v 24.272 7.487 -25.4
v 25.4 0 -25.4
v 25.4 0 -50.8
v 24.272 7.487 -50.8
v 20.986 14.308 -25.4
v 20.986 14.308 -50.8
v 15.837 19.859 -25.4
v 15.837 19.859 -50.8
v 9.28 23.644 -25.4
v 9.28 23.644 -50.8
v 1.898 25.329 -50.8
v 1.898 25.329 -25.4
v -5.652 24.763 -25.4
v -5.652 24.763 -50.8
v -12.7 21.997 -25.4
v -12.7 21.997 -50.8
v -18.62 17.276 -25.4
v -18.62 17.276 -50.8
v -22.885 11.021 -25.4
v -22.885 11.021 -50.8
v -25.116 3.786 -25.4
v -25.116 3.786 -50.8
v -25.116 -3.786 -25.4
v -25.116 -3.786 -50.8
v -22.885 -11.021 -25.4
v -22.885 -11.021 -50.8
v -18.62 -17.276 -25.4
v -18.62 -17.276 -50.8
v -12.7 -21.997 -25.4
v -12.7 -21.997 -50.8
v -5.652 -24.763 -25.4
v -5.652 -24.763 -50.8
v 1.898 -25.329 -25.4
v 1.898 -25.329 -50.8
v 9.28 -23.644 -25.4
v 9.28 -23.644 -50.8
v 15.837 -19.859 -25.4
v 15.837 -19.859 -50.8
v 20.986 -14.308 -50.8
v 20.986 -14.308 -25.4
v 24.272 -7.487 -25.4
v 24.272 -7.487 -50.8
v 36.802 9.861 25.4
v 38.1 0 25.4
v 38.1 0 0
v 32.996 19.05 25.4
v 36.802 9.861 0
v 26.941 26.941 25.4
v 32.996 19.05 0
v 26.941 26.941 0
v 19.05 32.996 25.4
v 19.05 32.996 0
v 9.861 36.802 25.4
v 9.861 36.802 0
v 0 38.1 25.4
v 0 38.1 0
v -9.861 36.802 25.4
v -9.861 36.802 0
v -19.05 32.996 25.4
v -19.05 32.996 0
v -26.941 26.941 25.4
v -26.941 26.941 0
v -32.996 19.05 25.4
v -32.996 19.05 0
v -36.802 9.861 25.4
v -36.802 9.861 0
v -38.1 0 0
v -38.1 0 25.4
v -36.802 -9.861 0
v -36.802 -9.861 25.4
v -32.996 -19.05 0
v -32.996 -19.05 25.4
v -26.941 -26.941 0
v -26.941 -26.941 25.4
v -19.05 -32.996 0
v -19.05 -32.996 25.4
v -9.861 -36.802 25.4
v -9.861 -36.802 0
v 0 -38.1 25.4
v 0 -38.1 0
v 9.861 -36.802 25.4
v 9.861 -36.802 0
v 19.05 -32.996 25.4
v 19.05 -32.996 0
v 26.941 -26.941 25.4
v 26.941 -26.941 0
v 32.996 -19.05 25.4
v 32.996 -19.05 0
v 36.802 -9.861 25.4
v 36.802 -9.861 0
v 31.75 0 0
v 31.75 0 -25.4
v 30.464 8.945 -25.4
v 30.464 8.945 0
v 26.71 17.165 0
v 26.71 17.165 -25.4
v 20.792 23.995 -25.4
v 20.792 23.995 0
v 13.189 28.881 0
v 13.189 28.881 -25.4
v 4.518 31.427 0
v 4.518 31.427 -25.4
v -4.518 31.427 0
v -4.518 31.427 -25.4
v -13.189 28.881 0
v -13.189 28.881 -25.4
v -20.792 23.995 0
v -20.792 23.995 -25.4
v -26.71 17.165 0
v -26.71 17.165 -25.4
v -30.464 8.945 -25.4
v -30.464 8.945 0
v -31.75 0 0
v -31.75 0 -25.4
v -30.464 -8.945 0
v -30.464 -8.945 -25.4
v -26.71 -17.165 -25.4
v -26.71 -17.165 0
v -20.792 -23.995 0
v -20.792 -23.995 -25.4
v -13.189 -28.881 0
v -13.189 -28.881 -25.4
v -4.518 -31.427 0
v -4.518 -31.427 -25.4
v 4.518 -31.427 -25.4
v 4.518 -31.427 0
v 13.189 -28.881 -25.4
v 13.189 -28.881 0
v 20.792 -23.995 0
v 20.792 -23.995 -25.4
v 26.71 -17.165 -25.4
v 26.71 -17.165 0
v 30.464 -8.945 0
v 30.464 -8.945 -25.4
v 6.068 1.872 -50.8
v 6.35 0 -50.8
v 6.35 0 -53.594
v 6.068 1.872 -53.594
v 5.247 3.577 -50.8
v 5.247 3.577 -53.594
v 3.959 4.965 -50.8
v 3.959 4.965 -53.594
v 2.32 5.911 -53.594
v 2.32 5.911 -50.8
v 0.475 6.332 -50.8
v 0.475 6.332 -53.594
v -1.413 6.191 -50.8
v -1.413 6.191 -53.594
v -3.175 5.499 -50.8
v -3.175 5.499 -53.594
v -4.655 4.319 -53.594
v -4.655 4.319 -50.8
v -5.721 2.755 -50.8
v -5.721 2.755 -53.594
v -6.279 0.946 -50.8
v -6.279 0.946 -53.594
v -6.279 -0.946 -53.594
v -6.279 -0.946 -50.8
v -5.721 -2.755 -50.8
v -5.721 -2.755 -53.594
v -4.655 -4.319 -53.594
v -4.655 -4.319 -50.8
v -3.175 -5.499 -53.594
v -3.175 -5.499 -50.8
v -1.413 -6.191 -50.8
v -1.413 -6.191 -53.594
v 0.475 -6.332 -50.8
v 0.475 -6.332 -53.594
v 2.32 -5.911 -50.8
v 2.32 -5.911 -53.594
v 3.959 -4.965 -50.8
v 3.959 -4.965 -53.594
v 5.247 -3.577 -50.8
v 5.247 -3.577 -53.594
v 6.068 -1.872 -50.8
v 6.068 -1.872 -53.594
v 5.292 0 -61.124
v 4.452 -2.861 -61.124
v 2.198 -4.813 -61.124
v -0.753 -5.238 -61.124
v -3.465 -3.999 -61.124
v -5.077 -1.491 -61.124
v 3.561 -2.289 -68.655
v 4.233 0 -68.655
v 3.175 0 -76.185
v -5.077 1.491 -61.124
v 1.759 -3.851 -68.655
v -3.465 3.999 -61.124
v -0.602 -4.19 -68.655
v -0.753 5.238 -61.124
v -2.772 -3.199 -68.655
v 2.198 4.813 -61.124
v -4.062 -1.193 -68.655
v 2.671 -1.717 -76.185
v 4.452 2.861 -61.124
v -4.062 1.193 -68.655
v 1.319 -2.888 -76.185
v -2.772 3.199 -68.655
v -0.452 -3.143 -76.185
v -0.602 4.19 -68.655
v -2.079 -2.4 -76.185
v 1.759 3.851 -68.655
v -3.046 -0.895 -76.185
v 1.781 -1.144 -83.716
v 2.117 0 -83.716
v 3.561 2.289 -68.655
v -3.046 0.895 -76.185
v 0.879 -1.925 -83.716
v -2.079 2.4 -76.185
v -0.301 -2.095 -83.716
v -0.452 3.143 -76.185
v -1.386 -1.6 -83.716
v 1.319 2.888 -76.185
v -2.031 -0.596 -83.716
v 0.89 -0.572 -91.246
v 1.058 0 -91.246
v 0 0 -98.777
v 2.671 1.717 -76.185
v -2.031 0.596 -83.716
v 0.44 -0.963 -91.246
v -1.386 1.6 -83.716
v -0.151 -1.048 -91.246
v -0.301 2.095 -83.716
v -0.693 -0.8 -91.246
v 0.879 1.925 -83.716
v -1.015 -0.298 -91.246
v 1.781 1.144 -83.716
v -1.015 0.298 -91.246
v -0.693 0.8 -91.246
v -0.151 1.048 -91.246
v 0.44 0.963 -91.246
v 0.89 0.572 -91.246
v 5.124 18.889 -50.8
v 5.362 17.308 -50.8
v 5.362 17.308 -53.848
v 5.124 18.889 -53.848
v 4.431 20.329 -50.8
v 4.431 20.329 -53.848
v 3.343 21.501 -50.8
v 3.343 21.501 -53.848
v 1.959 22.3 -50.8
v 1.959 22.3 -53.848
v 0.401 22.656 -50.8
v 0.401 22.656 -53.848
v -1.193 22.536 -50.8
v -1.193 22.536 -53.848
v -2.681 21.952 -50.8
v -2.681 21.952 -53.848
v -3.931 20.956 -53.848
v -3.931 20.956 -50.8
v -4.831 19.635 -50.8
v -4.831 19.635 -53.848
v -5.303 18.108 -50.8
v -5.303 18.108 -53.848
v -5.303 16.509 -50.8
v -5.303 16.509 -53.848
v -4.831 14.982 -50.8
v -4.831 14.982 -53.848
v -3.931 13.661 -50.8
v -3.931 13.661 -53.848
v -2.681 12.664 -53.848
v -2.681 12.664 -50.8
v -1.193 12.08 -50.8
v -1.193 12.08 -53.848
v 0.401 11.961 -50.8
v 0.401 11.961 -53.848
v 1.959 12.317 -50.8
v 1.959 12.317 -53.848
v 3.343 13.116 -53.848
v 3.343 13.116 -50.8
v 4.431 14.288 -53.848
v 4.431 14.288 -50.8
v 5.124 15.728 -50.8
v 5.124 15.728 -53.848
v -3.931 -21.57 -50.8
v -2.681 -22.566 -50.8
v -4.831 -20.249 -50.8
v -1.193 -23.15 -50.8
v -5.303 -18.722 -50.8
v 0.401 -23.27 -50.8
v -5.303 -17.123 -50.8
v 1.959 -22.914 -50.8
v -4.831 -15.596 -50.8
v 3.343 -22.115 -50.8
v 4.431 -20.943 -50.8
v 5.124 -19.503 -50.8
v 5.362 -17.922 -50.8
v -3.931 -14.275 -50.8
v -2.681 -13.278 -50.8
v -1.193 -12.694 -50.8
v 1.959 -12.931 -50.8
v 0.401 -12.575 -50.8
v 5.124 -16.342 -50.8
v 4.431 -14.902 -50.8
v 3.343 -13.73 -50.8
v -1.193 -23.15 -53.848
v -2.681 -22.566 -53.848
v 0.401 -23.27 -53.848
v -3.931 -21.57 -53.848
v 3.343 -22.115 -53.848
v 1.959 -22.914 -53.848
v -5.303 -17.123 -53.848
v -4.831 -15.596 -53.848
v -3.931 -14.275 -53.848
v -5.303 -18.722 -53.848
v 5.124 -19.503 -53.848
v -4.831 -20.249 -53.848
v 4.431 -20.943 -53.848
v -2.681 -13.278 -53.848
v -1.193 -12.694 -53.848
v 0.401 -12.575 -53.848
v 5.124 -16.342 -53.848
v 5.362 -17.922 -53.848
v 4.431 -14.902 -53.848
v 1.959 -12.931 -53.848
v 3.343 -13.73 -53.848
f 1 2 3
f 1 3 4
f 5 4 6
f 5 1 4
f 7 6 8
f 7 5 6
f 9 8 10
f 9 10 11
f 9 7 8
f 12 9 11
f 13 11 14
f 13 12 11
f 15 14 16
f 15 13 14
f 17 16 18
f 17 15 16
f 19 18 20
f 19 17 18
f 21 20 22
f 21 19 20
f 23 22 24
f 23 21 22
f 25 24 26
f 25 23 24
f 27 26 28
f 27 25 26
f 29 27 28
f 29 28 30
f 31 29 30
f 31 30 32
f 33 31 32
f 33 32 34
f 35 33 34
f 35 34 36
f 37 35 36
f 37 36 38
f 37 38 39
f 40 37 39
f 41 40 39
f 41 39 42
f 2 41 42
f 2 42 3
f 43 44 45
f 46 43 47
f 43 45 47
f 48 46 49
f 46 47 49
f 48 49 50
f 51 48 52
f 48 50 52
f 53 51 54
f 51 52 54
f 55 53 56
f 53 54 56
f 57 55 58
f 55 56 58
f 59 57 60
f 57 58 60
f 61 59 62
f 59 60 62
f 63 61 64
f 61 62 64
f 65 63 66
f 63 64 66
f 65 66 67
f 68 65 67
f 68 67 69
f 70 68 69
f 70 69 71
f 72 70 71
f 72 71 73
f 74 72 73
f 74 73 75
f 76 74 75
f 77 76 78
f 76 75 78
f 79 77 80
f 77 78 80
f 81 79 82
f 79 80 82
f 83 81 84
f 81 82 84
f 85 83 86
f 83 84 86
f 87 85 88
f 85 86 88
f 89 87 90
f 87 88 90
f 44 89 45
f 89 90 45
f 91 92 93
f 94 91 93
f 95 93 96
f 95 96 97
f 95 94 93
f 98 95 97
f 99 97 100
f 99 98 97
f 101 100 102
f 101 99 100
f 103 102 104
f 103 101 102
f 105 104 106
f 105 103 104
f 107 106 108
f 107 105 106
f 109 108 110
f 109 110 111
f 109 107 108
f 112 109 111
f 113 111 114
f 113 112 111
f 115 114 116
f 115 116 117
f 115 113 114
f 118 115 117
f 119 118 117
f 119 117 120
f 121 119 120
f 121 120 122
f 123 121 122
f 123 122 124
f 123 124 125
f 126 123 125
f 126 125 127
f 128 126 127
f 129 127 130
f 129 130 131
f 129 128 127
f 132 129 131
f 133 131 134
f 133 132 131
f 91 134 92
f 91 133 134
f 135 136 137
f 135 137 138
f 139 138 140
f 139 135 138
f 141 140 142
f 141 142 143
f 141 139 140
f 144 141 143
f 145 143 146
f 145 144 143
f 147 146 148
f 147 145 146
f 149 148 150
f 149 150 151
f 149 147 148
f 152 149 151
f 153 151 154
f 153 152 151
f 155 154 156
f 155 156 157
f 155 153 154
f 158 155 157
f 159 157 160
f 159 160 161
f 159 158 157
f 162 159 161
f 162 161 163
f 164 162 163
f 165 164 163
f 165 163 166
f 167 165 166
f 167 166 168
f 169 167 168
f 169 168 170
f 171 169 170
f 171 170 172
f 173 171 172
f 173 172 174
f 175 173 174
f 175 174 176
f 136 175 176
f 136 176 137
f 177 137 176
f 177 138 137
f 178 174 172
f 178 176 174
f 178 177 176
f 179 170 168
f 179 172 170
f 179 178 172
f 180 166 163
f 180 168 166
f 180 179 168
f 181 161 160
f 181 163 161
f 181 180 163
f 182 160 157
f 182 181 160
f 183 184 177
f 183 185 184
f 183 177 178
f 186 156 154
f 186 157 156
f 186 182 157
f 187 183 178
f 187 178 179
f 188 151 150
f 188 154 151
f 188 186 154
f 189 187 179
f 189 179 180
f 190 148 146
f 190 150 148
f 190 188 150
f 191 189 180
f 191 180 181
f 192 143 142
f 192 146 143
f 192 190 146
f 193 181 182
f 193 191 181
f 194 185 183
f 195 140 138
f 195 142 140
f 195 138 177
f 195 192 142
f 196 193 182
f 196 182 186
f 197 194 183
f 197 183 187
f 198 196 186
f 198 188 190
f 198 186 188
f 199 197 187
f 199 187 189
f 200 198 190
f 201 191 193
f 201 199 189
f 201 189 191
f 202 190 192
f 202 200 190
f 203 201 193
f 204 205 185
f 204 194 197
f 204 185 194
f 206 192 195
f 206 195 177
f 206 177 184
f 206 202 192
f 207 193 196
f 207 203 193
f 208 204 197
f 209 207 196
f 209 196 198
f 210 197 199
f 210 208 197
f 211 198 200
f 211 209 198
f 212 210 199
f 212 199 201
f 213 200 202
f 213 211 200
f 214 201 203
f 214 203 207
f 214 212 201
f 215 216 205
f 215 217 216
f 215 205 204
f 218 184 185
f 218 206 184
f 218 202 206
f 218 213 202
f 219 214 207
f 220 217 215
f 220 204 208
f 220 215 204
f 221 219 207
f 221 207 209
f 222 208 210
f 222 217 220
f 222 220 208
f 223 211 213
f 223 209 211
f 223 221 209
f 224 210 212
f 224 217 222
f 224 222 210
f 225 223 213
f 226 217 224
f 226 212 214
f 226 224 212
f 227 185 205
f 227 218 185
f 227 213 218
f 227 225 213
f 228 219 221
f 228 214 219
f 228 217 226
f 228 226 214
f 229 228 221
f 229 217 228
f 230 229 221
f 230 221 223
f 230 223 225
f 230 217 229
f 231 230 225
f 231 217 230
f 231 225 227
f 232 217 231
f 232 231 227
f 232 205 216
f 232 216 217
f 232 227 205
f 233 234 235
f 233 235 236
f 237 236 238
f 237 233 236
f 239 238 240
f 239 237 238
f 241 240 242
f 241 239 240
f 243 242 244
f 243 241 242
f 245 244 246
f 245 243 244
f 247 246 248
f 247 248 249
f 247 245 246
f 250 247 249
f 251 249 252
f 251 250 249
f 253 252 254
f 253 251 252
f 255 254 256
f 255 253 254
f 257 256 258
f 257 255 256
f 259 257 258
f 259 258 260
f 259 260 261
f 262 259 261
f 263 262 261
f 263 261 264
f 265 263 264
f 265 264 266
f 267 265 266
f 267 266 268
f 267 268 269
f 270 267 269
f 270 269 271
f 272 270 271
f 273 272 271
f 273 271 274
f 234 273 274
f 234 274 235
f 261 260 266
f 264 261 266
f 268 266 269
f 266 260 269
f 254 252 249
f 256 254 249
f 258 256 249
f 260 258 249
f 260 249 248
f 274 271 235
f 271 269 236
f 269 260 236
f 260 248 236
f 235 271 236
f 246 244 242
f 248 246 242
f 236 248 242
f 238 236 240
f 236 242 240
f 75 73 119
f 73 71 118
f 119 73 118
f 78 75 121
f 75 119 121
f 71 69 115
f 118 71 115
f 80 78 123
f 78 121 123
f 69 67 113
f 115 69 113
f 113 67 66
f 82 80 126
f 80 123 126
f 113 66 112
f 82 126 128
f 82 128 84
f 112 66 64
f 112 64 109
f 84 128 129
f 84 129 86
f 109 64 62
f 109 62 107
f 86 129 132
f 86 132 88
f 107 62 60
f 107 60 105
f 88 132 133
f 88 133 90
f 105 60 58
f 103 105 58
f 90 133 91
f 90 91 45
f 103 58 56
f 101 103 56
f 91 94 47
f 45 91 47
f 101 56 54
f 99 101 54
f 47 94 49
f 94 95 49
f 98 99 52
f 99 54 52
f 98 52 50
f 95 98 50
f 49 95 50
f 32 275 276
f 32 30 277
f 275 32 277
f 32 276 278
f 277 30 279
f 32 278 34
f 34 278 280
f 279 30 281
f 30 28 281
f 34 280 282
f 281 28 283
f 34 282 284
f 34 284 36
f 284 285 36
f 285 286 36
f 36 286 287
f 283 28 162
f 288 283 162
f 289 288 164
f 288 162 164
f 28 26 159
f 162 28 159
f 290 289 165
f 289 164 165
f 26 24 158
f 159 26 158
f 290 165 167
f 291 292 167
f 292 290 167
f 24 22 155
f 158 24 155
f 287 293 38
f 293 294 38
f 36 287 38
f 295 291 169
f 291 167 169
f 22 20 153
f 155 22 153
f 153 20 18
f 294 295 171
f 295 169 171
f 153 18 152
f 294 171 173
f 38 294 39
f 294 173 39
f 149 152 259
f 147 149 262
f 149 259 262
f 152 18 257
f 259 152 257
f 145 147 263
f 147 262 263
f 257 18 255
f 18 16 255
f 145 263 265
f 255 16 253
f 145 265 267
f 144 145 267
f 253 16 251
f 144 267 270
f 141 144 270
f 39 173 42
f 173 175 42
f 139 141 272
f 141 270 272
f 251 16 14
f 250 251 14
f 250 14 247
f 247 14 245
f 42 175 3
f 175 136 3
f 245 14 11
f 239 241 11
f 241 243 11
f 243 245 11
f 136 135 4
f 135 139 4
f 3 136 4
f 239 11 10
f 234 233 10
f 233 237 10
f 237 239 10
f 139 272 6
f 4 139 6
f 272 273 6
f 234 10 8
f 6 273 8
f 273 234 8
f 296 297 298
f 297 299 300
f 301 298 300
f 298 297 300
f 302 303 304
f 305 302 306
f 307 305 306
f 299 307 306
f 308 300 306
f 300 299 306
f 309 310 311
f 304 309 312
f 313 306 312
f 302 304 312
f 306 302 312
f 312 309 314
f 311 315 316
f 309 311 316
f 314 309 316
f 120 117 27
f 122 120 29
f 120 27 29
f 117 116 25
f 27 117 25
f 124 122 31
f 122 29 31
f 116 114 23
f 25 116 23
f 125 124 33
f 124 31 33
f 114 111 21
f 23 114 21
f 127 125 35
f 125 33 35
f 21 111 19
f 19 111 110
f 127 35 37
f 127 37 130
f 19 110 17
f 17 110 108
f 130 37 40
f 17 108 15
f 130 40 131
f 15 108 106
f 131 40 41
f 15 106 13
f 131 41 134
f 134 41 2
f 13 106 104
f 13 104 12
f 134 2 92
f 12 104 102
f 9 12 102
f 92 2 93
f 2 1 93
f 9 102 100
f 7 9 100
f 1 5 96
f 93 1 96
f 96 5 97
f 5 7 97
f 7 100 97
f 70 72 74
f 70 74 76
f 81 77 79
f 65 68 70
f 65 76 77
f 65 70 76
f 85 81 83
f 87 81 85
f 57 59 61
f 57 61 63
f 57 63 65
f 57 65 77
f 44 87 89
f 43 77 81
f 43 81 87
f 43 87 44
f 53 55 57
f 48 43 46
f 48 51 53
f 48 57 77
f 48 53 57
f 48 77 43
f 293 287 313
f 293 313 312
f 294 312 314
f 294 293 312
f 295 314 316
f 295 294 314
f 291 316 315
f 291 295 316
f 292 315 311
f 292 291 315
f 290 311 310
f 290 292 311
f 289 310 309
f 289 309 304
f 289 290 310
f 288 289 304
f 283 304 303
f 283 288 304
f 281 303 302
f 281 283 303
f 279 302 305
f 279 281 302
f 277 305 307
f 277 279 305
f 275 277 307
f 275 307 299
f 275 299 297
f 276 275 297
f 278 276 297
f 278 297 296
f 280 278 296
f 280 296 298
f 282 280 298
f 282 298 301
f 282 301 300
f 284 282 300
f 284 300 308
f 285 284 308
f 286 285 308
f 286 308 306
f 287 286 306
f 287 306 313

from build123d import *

# Parameters (mm, degrees)
F0_R      = 38.1
F1_DEPTH  = 25.4
F2_R      = 31.75
F3_DEPTH  = 25.4
F4_R      = 25.4
F5_DEPTH  = 50.8
F6_R      = 6.35
F7_DEPTH  = 53.594
F7_FACE_R = 6.35
F10_R     = 5.3624799473
F11_DEPTH = 53.848
F9_R      = 5.3624799473
F12_DEPTH = 53.848


# Not quite as in the source:
# - an extrude whose draft closes it to a point is written as a loft to that point


with BuildPart() as f1:
    # F0 (on Top) → F1 (new body)
    with BuildSketch(Plane.XY):
        Circle(F0_R)
    extrude(amount=F1_DEPTH)

    # F2 (on Top) → F3 (join)
    with BuildSketch(Plane.XY):
        Circle(F2_R)
    extrude(amount=-F3_DEPTH)

    # F4 (on Top) → F5 (join)
    with BuildSketch(Plane.XY):
        Circle(F4_R)
    extrude(amount=-F5_DEPTH)

    # F6 (on Top) → F7 (join)
    with BuildSketch(Plane.XY):
        Circle(F6_R)
    extrude(amount=-F7_DEPTH)

    # F7_face (on face) → F8 section 0
    with BuildSketch(Plane(origin=(0, 0, -53.594), x_dir=(1, 0, 0), z_dir=(0, 0, -1)), mode=Mode.PRIVATE) as f8_s0:
        Circle(F7_FACE_R)
    loft([f8_s0.sketch, Vertex(0, 0, -98.7765977371)], ruled=True)

    # F10 (on Top) → F11 (join)
    with BuildSketch(Plane.XY):
        with Locations((0, 17.3083227128)):
            Circle(F10_R)
    extrude(amount=-F11_DEPTH)

    # F9 (on Top) → F12 (join)
    with BuildSketch(Plane.XY):
        with Locations((0, -17.9224163294)):
            Circle(F9_R)
    extrude(amount=-F12_DEPTH)


solid = f1.part
